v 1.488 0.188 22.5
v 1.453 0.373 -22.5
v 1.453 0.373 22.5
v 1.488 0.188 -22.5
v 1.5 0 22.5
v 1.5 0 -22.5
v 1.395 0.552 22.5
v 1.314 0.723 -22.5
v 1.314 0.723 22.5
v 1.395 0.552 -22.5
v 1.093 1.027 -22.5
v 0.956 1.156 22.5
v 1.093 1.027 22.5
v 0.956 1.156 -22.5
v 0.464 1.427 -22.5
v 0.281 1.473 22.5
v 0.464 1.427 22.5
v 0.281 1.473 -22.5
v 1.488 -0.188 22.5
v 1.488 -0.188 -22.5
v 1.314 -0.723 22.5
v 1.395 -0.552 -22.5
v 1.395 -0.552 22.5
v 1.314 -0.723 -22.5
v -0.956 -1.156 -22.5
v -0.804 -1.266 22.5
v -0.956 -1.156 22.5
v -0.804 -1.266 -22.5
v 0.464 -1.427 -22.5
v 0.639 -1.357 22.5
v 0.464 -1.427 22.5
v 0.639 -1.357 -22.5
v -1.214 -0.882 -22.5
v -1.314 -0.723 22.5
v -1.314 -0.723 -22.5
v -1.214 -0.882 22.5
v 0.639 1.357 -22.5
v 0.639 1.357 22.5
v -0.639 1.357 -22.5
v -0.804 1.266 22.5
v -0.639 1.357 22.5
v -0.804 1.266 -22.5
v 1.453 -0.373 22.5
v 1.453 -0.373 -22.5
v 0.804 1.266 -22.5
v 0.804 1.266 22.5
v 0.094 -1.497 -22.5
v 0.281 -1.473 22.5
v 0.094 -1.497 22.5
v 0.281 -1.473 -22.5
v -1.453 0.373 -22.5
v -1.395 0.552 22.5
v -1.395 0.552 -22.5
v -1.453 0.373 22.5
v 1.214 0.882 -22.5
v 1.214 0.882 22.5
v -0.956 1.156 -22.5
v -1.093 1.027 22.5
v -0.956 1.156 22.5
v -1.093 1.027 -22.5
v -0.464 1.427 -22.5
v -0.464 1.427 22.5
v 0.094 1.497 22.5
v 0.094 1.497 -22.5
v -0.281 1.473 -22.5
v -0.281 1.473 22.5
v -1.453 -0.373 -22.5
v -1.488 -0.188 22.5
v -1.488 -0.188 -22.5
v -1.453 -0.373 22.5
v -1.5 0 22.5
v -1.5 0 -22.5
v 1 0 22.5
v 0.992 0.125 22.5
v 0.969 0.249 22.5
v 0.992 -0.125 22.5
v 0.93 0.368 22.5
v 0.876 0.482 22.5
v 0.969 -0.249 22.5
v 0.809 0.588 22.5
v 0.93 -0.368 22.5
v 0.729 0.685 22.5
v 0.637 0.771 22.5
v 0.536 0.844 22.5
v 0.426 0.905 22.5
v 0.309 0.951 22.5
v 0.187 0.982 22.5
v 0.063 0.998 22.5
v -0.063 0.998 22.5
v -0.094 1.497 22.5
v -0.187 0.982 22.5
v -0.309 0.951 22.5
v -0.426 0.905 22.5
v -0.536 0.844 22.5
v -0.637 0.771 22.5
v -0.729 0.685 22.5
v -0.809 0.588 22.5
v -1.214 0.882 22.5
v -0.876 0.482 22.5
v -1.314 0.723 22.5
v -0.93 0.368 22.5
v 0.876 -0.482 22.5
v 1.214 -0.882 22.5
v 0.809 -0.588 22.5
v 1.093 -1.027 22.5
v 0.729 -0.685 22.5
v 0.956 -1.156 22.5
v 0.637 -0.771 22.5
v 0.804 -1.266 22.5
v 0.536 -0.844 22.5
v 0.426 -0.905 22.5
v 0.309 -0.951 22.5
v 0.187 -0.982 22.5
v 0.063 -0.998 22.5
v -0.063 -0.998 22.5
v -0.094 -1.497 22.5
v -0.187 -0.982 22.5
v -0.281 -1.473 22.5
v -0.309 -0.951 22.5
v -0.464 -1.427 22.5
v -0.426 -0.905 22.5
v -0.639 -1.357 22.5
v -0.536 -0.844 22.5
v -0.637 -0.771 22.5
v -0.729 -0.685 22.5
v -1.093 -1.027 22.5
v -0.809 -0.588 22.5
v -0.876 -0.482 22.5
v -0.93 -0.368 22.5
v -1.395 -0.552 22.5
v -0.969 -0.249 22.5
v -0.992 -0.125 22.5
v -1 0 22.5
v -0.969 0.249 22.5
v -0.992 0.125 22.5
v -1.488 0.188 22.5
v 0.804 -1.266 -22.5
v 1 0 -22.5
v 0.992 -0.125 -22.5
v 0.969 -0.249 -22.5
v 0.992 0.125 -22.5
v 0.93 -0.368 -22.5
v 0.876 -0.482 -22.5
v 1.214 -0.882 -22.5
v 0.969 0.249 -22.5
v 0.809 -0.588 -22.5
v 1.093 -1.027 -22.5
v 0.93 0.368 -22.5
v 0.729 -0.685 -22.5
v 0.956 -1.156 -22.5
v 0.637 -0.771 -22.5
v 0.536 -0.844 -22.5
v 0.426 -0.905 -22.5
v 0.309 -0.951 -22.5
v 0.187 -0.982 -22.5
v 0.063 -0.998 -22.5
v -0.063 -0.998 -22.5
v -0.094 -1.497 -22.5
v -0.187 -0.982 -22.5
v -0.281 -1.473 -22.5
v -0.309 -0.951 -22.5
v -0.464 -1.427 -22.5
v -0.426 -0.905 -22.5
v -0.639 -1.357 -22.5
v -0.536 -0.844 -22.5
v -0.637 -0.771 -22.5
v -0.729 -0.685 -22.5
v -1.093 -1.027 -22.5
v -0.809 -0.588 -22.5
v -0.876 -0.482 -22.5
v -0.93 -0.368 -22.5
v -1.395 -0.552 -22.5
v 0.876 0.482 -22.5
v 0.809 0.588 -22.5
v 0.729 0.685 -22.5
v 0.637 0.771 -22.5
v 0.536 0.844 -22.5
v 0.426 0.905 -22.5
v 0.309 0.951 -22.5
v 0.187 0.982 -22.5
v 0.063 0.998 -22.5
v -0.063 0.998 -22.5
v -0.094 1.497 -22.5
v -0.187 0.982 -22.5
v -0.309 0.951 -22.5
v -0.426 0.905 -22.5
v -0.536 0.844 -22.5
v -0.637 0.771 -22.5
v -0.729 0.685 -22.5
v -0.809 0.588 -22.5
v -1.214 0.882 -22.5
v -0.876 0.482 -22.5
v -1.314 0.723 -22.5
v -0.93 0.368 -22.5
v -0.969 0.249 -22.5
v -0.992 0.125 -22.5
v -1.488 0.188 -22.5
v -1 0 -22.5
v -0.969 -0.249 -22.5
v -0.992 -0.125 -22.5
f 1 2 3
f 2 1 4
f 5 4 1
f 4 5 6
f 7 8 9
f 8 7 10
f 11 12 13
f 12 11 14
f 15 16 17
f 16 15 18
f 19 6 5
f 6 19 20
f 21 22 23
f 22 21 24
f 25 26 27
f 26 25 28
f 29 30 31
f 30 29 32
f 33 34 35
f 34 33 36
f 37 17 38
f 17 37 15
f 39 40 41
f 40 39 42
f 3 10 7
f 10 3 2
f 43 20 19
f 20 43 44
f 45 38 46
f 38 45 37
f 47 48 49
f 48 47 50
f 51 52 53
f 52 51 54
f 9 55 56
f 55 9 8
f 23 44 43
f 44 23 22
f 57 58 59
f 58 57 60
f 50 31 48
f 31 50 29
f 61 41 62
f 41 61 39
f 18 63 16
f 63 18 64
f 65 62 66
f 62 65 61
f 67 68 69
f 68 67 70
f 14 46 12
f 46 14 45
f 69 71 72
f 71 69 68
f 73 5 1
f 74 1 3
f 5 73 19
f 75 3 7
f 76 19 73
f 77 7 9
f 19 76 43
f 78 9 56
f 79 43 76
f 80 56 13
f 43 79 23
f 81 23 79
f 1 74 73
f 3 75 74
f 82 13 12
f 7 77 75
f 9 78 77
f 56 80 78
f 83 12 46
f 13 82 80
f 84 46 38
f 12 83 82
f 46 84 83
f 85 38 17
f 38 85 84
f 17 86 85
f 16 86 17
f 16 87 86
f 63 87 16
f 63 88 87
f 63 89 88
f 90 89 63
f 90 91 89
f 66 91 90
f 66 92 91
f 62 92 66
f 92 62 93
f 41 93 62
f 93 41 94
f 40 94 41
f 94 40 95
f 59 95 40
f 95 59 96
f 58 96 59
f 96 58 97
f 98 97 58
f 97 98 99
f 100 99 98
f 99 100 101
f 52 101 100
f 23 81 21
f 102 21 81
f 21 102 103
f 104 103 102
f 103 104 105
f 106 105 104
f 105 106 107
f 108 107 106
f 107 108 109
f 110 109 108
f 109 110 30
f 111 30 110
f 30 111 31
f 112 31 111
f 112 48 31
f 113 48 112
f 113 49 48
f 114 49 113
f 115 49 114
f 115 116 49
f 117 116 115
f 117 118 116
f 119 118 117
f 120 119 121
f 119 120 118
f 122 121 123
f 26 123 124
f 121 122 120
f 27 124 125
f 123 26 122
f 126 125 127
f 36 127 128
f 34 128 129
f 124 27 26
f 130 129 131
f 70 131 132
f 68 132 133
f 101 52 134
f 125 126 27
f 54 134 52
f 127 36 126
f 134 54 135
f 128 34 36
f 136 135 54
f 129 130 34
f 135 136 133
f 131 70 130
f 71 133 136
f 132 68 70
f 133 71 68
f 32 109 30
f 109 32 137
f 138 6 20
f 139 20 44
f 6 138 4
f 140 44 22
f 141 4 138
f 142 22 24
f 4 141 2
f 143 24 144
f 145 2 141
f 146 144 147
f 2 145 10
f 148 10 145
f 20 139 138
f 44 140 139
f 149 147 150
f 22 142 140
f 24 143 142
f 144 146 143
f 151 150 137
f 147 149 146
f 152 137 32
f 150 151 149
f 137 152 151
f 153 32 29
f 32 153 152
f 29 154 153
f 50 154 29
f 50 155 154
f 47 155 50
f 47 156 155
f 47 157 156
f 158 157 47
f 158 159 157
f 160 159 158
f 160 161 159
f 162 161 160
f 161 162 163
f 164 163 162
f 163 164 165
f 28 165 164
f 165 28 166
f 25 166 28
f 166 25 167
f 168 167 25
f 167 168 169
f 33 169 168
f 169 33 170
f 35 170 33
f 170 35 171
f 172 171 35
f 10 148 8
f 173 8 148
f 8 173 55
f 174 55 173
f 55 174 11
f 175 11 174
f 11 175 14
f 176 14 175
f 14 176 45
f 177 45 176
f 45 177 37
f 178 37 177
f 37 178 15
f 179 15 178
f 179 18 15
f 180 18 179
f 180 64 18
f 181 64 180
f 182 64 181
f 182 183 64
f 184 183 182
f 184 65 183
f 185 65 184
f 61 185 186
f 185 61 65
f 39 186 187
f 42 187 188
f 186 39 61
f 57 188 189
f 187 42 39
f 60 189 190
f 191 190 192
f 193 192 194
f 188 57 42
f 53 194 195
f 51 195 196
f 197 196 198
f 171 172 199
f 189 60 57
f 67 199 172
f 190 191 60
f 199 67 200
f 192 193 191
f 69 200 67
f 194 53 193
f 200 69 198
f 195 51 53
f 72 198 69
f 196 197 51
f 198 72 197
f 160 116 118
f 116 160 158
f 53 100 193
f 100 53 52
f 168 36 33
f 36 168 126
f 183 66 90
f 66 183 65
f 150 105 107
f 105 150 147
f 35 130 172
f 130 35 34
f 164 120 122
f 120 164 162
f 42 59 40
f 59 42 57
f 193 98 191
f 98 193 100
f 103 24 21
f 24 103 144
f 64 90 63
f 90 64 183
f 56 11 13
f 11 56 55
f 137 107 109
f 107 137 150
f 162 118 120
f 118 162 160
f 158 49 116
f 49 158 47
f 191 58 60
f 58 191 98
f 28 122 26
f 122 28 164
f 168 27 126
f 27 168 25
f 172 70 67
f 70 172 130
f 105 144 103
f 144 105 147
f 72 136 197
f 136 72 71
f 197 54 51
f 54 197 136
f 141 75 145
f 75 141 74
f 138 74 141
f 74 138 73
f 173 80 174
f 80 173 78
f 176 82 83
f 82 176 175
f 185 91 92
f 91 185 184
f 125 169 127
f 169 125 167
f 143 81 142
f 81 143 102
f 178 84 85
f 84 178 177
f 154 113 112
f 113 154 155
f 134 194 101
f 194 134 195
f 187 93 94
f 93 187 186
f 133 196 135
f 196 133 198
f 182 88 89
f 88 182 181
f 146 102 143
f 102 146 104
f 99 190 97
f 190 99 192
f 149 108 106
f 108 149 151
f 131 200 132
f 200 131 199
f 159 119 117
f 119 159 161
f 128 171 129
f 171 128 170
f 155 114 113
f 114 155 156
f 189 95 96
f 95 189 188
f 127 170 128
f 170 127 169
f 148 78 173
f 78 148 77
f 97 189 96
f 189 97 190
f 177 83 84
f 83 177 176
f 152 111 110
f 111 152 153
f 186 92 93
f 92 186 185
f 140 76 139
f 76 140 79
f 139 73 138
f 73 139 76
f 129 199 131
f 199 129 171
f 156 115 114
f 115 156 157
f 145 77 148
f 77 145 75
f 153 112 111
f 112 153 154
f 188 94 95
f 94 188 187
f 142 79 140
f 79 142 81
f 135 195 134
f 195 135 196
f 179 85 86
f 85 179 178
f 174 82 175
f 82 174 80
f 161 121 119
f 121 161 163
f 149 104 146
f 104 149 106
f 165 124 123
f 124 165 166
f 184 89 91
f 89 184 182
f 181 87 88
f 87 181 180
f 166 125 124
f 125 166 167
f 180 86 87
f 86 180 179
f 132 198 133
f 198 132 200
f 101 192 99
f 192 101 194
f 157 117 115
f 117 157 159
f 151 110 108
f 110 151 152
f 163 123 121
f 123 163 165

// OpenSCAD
$fn = 50;


difference() {
	union() {
		translate(v = [0, 0, -22.5000000000]) {
			cylinder(h = 45, r = 1.5000000000);
		}
	}
	union() {
		translate(v = [0, 0, -100.0000000000]) {
			cylinder(h = 200, r = 1.0000000000);
		}
	}
}
